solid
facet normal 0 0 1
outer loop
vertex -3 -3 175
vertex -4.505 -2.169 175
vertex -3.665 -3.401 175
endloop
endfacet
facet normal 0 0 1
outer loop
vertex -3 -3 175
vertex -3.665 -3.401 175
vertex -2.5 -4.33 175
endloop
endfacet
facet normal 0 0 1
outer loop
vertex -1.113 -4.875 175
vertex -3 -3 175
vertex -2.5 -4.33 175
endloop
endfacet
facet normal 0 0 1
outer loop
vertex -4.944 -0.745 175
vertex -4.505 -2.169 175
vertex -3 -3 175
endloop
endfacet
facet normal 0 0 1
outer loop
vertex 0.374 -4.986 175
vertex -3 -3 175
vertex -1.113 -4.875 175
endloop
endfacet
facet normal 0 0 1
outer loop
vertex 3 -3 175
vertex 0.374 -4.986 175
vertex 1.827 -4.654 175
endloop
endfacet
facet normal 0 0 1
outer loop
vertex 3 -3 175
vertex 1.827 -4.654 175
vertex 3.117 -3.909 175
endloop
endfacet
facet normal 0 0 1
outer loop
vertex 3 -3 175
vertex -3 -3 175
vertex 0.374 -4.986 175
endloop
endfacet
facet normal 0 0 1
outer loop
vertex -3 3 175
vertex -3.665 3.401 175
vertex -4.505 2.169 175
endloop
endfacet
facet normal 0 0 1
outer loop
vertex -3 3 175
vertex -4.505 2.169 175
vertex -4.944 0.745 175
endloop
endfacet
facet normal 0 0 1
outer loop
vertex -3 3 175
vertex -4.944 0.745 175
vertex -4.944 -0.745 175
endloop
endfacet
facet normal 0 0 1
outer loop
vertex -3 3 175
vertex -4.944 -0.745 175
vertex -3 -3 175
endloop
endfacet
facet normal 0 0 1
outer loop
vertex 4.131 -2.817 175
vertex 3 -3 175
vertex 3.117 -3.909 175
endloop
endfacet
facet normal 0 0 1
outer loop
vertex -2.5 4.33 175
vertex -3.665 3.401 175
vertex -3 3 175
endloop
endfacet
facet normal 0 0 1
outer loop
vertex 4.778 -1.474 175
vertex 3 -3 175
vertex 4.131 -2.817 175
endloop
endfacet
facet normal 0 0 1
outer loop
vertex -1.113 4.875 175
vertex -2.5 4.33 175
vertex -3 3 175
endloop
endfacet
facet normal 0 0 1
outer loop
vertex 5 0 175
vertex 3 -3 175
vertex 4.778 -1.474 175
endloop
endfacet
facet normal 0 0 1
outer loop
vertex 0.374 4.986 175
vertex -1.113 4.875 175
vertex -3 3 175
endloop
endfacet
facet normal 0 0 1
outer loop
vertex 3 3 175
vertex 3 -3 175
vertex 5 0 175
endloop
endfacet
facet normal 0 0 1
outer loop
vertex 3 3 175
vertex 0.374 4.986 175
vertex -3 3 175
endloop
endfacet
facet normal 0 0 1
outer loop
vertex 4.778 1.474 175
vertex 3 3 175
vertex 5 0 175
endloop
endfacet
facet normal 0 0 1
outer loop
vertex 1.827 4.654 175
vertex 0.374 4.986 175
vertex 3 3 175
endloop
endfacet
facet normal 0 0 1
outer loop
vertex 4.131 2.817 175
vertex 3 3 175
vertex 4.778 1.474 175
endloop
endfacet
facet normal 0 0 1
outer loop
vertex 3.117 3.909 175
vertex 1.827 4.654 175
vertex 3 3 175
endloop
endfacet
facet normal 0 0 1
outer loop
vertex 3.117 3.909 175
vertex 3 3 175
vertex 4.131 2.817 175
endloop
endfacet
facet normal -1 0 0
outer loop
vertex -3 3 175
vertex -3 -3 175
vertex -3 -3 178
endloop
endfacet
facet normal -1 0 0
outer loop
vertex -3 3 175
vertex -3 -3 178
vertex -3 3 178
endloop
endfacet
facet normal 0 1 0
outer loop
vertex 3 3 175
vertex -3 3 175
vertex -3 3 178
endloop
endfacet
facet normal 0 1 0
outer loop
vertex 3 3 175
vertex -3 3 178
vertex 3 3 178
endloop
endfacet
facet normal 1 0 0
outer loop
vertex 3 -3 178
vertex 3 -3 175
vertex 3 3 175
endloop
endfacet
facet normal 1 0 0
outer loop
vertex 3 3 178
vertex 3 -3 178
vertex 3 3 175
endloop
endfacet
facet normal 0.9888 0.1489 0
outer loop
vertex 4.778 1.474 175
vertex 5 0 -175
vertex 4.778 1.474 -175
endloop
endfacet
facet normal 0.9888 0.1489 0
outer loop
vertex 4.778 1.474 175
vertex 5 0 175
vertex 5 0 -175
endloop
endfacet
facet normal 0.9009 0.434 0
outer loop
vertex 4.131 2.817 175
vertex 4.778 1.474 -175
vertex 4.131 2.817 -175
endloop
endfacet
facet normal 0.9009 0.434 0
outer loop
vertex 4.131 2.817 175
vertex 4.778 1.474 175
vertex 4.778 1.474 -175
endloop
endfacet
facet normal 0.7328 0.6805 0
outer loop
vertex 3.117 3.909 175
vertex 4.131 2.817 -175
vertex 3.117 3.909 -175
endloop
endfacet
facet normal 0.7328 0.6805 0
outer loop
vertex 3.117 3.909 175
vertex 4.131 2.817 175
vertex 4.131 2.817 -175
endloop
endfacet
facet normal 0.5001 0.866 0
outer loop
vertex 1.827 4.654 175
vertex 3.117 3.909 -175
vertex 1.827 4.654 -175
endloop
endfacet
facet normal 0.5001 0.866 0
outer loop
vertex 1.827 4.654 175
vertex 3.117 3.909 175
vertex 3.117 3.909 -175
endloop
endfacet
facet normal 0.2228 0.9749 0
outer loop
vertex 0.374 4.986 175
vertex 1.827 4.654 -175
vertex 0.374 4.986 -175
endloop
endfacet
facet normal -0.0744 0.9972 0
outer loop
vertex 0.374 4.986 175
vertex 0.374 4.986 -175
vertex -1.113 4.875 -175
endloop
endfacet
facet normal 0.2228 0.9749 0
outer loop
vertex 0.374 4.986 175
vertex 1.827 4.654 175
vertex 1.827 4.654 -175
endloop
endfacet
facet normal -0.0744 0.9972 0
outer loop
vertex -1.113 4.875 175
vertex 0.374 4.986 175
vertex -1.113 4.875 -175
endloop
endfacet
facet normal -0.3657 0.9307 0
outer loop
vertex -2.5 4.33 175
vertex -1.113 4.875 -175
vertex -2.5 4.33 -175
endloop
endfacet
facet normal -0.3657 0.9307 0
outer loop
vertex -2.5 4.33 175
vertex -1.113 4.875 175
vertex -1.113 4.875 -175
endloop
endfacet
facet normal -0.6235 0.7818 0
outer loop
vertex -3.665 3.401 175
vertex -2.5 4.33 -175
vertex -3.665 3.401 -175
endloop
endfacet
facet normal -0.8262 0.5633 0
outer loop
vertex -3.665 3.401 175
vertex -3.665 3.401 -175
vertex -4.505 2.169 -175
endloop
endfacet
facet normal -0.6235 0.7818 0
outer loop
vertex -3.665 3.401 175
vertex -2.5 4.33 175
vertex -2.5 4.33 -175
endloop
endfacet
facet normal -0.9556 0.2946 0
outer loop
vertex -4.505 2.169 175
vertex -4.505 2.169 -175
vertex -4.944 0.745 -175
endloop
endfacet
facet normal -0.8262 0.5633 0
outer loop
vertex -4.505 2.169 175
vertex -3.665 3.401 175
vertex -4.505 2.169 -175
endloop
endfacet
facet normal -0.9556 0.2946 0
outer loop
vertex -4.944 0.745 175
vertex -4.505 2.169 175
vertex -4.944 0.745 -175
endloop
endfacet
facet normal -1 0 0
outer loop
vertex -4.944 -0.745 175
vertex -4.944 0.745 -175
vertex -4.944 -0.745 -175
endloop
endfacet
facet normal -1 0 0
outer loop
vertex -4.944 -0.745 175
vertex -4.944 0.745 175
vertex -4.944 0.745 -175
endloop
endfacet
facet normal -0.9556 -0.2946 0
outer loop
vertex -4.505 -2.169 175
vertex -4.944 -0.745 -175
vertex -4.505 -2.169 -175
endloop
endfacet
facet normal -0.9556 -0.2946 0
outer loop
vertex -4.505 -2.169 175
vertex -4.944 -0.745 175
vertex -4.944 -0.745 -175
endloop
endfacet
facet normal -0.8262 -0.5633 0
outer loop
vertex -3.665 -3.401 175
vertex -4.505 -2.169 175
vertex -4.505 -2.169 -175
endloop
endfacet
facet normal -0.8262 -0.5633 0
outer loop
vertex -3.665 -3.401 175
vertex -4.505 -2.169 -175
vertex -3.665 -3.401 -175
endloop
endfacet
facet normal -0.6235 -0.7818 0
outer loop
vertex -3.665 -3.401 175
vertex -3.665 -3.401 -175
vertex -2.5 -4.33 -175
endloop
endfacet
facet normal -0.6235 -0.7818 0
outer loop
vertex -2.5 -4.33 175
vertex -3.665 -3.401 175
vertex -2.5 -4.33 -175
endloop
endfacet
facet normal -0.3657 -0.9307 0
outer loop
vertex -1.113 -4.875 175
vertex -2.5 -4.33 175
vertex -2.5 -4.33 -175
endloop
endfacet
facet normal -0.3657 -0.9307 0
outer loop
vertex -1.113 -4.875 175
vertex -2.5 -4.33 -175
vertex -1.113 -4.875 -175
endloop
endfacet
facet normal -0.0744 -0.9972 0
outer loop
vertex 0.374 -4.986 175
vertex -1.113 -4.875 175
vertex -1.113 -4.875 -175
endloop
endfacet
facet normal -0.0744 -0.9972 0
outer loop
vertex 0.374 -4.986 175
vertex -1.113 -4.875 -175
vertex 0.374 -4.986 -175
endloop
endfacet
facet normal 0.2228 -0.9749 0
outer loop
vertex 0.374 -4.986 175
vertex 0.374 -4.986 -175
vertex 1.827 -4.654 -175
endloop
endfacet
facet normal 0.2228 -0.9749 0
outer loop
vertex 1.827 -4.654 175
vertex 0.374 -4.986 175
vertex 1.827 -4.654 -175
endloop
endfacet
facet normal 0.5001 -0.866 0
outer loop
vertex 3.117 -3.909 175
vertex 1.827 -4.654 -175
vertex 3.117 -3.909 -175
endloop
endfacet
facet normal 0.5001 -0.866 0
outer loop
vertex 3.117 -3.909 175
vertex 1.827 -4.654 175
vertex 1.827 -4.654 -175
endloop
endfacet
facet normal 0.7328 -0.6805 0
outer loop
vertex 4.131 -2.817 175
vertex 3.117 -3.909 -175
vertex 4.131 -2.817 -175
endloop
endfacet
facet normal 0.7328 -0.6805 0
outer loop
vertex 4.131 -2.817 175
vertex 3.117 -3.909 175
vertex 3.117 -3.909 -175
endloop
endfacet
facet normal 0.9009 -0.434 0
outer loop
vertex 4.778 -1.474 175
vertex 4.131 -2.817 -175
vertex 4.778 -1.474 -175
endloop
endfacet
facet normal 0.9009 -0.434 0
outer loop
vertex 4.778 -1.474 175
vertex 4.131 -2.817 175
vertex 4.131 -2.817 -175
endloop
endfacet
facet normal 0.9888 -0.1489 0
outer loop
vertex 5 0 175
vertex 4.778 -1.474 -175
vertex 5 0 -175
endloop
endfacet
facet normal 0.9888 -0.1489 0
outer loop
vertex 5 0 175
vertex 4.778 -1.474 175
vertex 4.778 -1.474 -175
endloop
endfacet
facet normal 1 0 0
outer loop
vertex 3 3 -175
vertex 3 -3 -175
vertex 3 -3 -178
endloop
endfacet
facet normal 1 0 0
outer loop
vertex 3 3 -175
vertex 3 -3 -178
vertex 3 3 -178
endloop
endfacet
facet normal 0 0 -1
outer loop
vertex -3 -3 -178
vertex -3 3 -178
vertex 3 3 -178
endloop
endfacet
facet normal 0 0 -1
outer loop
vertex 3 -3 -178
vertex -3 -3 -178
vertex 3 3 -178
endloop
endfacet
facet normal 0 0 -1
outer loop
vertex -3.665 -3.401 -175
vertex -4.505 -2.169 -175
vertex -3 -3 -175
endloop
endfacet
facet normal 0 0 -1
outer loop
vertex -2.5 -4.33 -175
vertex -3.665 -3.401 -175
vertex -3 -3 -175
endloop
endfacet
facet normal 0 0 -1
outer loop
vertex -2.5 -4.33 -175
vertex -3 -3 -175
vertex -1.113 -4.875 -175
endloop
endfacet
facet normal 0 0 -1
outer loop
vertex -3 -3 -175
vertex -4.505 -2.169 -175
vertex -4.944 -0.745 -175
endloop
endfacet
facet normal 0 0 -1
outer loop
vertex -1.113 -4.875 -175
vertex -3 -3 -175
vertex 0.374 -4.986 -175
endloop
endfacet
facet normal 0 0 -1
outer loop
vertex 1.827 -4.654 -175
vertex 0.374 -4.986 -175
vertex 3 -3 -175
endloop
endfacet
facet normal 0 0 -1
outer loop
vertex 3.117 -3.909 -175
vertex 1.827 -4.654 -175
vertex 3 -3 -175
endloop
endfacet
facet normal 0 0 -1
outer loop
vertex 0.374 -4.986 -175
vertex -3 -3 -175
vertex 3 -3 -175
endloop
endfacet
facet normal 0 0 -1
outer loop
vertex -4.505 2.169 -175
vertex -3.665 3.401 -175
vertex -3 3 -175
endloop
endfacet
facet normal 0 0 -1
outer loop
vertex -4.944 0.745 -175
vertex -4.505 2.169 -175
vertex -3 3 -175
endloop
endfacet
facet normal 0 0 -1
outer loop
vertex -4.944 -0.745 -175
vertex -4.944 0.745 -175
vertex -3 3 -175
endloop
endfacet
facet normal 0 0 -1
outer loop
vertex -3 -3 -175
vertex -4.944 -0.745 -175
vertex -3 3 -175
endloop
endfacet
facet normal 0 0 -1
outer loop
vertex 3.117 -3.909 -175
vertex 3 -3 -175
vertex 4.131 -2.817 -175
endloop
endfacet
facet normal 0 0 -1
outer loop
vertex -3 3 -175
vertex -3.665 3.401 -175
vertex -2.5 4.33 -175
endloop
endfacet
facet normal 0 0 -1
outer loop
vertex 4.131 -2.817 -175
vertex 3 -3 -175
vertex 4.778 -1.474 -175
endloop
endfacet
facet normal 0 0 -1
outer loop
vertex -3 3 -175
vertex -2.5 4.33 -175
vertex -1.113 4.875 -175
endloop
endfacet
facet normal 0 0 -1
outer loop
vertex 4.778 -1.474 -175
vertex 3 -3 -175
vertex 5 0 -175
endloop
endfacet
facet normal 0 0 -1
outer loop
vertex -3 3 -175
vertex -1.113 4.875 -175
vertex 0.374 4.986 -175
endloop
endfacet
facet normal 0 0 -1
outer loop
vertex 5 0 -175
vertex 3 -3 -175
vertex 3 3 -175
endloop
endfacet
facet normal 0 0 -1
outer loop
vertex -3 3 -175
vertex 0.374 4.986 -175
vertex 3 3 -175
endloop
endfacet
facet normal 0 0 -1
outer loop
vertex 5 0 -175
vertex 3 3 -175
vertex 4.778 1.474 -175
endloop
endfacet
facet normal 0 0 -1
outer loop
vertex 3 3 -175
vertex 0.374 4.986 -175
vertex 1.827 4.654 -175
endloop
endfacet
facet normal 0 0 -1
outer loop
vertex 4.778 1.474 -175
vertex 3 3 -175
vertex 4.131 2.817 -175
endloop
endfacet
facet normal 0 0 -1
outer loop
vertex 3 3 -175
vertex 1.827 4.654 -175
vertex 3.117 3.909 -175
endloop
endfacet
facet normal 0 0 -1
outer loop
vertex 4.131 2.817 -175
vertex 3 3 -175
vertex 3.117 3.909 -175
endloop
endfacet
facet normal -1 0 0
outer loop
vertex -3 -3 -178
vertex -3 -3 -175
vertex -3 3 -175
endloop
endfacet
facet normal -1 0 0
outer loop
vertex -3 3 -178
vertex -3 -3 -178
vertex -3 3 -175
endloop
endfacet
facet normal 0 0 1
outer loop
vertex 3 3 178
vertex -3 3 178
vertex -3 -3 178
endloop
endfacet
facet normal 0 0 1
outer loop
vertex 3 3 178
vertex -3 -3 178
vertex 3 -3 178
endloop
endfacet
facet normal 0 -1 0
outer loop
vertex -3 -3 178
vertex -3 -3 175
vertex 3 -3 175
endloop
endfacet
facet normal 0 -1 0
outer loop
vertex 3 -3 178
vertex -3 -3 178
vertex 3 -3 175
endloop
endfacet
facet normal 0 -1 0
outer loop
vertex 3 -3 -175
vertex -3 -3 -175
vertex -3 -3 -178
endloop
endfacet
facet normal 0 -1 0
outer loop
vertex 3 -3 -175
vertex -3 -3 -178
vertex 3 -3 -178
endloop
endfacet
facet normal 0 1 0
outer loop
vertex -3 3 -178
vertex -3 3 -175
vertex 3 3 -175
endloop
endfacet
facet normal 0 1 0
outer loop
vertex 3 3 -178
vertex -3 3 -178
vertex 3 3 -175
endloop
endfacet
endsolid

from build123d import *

# Parameters (mm, degrees)
SKETCH1_R           = 5
BOSS_EXTRUDE1_DEPTH = 175
SKETCH2_W           = 6
SKETCH2_H           = 6
BOSS_EXTRUDE2_DEPTH = 3


with BuildPart() as part:
    # Sketch1 → Boss-Extrude1 (new, symmetric)
    with BuildSketch(Plane.XY):
        Circle(SKETCH1_R)
    extrude(amount=BOSS_EXTRUDE1_DEPTH, both=True)

    # Sketch2 → Boss-Extrude2 (add)
    with BuildSketch(Plane.XY.offset(175)):
        Rectangle(SKETCH2_W, SKETCH2_H)
    boss_extrude2 = extrude(amount=BOSS_EXTRUDE2_DEPTH)

    # Mirror1: Boss-Extrude2 across plane
    add(boss_extrude2.mirror(Plane.XY))


solid = part.part
